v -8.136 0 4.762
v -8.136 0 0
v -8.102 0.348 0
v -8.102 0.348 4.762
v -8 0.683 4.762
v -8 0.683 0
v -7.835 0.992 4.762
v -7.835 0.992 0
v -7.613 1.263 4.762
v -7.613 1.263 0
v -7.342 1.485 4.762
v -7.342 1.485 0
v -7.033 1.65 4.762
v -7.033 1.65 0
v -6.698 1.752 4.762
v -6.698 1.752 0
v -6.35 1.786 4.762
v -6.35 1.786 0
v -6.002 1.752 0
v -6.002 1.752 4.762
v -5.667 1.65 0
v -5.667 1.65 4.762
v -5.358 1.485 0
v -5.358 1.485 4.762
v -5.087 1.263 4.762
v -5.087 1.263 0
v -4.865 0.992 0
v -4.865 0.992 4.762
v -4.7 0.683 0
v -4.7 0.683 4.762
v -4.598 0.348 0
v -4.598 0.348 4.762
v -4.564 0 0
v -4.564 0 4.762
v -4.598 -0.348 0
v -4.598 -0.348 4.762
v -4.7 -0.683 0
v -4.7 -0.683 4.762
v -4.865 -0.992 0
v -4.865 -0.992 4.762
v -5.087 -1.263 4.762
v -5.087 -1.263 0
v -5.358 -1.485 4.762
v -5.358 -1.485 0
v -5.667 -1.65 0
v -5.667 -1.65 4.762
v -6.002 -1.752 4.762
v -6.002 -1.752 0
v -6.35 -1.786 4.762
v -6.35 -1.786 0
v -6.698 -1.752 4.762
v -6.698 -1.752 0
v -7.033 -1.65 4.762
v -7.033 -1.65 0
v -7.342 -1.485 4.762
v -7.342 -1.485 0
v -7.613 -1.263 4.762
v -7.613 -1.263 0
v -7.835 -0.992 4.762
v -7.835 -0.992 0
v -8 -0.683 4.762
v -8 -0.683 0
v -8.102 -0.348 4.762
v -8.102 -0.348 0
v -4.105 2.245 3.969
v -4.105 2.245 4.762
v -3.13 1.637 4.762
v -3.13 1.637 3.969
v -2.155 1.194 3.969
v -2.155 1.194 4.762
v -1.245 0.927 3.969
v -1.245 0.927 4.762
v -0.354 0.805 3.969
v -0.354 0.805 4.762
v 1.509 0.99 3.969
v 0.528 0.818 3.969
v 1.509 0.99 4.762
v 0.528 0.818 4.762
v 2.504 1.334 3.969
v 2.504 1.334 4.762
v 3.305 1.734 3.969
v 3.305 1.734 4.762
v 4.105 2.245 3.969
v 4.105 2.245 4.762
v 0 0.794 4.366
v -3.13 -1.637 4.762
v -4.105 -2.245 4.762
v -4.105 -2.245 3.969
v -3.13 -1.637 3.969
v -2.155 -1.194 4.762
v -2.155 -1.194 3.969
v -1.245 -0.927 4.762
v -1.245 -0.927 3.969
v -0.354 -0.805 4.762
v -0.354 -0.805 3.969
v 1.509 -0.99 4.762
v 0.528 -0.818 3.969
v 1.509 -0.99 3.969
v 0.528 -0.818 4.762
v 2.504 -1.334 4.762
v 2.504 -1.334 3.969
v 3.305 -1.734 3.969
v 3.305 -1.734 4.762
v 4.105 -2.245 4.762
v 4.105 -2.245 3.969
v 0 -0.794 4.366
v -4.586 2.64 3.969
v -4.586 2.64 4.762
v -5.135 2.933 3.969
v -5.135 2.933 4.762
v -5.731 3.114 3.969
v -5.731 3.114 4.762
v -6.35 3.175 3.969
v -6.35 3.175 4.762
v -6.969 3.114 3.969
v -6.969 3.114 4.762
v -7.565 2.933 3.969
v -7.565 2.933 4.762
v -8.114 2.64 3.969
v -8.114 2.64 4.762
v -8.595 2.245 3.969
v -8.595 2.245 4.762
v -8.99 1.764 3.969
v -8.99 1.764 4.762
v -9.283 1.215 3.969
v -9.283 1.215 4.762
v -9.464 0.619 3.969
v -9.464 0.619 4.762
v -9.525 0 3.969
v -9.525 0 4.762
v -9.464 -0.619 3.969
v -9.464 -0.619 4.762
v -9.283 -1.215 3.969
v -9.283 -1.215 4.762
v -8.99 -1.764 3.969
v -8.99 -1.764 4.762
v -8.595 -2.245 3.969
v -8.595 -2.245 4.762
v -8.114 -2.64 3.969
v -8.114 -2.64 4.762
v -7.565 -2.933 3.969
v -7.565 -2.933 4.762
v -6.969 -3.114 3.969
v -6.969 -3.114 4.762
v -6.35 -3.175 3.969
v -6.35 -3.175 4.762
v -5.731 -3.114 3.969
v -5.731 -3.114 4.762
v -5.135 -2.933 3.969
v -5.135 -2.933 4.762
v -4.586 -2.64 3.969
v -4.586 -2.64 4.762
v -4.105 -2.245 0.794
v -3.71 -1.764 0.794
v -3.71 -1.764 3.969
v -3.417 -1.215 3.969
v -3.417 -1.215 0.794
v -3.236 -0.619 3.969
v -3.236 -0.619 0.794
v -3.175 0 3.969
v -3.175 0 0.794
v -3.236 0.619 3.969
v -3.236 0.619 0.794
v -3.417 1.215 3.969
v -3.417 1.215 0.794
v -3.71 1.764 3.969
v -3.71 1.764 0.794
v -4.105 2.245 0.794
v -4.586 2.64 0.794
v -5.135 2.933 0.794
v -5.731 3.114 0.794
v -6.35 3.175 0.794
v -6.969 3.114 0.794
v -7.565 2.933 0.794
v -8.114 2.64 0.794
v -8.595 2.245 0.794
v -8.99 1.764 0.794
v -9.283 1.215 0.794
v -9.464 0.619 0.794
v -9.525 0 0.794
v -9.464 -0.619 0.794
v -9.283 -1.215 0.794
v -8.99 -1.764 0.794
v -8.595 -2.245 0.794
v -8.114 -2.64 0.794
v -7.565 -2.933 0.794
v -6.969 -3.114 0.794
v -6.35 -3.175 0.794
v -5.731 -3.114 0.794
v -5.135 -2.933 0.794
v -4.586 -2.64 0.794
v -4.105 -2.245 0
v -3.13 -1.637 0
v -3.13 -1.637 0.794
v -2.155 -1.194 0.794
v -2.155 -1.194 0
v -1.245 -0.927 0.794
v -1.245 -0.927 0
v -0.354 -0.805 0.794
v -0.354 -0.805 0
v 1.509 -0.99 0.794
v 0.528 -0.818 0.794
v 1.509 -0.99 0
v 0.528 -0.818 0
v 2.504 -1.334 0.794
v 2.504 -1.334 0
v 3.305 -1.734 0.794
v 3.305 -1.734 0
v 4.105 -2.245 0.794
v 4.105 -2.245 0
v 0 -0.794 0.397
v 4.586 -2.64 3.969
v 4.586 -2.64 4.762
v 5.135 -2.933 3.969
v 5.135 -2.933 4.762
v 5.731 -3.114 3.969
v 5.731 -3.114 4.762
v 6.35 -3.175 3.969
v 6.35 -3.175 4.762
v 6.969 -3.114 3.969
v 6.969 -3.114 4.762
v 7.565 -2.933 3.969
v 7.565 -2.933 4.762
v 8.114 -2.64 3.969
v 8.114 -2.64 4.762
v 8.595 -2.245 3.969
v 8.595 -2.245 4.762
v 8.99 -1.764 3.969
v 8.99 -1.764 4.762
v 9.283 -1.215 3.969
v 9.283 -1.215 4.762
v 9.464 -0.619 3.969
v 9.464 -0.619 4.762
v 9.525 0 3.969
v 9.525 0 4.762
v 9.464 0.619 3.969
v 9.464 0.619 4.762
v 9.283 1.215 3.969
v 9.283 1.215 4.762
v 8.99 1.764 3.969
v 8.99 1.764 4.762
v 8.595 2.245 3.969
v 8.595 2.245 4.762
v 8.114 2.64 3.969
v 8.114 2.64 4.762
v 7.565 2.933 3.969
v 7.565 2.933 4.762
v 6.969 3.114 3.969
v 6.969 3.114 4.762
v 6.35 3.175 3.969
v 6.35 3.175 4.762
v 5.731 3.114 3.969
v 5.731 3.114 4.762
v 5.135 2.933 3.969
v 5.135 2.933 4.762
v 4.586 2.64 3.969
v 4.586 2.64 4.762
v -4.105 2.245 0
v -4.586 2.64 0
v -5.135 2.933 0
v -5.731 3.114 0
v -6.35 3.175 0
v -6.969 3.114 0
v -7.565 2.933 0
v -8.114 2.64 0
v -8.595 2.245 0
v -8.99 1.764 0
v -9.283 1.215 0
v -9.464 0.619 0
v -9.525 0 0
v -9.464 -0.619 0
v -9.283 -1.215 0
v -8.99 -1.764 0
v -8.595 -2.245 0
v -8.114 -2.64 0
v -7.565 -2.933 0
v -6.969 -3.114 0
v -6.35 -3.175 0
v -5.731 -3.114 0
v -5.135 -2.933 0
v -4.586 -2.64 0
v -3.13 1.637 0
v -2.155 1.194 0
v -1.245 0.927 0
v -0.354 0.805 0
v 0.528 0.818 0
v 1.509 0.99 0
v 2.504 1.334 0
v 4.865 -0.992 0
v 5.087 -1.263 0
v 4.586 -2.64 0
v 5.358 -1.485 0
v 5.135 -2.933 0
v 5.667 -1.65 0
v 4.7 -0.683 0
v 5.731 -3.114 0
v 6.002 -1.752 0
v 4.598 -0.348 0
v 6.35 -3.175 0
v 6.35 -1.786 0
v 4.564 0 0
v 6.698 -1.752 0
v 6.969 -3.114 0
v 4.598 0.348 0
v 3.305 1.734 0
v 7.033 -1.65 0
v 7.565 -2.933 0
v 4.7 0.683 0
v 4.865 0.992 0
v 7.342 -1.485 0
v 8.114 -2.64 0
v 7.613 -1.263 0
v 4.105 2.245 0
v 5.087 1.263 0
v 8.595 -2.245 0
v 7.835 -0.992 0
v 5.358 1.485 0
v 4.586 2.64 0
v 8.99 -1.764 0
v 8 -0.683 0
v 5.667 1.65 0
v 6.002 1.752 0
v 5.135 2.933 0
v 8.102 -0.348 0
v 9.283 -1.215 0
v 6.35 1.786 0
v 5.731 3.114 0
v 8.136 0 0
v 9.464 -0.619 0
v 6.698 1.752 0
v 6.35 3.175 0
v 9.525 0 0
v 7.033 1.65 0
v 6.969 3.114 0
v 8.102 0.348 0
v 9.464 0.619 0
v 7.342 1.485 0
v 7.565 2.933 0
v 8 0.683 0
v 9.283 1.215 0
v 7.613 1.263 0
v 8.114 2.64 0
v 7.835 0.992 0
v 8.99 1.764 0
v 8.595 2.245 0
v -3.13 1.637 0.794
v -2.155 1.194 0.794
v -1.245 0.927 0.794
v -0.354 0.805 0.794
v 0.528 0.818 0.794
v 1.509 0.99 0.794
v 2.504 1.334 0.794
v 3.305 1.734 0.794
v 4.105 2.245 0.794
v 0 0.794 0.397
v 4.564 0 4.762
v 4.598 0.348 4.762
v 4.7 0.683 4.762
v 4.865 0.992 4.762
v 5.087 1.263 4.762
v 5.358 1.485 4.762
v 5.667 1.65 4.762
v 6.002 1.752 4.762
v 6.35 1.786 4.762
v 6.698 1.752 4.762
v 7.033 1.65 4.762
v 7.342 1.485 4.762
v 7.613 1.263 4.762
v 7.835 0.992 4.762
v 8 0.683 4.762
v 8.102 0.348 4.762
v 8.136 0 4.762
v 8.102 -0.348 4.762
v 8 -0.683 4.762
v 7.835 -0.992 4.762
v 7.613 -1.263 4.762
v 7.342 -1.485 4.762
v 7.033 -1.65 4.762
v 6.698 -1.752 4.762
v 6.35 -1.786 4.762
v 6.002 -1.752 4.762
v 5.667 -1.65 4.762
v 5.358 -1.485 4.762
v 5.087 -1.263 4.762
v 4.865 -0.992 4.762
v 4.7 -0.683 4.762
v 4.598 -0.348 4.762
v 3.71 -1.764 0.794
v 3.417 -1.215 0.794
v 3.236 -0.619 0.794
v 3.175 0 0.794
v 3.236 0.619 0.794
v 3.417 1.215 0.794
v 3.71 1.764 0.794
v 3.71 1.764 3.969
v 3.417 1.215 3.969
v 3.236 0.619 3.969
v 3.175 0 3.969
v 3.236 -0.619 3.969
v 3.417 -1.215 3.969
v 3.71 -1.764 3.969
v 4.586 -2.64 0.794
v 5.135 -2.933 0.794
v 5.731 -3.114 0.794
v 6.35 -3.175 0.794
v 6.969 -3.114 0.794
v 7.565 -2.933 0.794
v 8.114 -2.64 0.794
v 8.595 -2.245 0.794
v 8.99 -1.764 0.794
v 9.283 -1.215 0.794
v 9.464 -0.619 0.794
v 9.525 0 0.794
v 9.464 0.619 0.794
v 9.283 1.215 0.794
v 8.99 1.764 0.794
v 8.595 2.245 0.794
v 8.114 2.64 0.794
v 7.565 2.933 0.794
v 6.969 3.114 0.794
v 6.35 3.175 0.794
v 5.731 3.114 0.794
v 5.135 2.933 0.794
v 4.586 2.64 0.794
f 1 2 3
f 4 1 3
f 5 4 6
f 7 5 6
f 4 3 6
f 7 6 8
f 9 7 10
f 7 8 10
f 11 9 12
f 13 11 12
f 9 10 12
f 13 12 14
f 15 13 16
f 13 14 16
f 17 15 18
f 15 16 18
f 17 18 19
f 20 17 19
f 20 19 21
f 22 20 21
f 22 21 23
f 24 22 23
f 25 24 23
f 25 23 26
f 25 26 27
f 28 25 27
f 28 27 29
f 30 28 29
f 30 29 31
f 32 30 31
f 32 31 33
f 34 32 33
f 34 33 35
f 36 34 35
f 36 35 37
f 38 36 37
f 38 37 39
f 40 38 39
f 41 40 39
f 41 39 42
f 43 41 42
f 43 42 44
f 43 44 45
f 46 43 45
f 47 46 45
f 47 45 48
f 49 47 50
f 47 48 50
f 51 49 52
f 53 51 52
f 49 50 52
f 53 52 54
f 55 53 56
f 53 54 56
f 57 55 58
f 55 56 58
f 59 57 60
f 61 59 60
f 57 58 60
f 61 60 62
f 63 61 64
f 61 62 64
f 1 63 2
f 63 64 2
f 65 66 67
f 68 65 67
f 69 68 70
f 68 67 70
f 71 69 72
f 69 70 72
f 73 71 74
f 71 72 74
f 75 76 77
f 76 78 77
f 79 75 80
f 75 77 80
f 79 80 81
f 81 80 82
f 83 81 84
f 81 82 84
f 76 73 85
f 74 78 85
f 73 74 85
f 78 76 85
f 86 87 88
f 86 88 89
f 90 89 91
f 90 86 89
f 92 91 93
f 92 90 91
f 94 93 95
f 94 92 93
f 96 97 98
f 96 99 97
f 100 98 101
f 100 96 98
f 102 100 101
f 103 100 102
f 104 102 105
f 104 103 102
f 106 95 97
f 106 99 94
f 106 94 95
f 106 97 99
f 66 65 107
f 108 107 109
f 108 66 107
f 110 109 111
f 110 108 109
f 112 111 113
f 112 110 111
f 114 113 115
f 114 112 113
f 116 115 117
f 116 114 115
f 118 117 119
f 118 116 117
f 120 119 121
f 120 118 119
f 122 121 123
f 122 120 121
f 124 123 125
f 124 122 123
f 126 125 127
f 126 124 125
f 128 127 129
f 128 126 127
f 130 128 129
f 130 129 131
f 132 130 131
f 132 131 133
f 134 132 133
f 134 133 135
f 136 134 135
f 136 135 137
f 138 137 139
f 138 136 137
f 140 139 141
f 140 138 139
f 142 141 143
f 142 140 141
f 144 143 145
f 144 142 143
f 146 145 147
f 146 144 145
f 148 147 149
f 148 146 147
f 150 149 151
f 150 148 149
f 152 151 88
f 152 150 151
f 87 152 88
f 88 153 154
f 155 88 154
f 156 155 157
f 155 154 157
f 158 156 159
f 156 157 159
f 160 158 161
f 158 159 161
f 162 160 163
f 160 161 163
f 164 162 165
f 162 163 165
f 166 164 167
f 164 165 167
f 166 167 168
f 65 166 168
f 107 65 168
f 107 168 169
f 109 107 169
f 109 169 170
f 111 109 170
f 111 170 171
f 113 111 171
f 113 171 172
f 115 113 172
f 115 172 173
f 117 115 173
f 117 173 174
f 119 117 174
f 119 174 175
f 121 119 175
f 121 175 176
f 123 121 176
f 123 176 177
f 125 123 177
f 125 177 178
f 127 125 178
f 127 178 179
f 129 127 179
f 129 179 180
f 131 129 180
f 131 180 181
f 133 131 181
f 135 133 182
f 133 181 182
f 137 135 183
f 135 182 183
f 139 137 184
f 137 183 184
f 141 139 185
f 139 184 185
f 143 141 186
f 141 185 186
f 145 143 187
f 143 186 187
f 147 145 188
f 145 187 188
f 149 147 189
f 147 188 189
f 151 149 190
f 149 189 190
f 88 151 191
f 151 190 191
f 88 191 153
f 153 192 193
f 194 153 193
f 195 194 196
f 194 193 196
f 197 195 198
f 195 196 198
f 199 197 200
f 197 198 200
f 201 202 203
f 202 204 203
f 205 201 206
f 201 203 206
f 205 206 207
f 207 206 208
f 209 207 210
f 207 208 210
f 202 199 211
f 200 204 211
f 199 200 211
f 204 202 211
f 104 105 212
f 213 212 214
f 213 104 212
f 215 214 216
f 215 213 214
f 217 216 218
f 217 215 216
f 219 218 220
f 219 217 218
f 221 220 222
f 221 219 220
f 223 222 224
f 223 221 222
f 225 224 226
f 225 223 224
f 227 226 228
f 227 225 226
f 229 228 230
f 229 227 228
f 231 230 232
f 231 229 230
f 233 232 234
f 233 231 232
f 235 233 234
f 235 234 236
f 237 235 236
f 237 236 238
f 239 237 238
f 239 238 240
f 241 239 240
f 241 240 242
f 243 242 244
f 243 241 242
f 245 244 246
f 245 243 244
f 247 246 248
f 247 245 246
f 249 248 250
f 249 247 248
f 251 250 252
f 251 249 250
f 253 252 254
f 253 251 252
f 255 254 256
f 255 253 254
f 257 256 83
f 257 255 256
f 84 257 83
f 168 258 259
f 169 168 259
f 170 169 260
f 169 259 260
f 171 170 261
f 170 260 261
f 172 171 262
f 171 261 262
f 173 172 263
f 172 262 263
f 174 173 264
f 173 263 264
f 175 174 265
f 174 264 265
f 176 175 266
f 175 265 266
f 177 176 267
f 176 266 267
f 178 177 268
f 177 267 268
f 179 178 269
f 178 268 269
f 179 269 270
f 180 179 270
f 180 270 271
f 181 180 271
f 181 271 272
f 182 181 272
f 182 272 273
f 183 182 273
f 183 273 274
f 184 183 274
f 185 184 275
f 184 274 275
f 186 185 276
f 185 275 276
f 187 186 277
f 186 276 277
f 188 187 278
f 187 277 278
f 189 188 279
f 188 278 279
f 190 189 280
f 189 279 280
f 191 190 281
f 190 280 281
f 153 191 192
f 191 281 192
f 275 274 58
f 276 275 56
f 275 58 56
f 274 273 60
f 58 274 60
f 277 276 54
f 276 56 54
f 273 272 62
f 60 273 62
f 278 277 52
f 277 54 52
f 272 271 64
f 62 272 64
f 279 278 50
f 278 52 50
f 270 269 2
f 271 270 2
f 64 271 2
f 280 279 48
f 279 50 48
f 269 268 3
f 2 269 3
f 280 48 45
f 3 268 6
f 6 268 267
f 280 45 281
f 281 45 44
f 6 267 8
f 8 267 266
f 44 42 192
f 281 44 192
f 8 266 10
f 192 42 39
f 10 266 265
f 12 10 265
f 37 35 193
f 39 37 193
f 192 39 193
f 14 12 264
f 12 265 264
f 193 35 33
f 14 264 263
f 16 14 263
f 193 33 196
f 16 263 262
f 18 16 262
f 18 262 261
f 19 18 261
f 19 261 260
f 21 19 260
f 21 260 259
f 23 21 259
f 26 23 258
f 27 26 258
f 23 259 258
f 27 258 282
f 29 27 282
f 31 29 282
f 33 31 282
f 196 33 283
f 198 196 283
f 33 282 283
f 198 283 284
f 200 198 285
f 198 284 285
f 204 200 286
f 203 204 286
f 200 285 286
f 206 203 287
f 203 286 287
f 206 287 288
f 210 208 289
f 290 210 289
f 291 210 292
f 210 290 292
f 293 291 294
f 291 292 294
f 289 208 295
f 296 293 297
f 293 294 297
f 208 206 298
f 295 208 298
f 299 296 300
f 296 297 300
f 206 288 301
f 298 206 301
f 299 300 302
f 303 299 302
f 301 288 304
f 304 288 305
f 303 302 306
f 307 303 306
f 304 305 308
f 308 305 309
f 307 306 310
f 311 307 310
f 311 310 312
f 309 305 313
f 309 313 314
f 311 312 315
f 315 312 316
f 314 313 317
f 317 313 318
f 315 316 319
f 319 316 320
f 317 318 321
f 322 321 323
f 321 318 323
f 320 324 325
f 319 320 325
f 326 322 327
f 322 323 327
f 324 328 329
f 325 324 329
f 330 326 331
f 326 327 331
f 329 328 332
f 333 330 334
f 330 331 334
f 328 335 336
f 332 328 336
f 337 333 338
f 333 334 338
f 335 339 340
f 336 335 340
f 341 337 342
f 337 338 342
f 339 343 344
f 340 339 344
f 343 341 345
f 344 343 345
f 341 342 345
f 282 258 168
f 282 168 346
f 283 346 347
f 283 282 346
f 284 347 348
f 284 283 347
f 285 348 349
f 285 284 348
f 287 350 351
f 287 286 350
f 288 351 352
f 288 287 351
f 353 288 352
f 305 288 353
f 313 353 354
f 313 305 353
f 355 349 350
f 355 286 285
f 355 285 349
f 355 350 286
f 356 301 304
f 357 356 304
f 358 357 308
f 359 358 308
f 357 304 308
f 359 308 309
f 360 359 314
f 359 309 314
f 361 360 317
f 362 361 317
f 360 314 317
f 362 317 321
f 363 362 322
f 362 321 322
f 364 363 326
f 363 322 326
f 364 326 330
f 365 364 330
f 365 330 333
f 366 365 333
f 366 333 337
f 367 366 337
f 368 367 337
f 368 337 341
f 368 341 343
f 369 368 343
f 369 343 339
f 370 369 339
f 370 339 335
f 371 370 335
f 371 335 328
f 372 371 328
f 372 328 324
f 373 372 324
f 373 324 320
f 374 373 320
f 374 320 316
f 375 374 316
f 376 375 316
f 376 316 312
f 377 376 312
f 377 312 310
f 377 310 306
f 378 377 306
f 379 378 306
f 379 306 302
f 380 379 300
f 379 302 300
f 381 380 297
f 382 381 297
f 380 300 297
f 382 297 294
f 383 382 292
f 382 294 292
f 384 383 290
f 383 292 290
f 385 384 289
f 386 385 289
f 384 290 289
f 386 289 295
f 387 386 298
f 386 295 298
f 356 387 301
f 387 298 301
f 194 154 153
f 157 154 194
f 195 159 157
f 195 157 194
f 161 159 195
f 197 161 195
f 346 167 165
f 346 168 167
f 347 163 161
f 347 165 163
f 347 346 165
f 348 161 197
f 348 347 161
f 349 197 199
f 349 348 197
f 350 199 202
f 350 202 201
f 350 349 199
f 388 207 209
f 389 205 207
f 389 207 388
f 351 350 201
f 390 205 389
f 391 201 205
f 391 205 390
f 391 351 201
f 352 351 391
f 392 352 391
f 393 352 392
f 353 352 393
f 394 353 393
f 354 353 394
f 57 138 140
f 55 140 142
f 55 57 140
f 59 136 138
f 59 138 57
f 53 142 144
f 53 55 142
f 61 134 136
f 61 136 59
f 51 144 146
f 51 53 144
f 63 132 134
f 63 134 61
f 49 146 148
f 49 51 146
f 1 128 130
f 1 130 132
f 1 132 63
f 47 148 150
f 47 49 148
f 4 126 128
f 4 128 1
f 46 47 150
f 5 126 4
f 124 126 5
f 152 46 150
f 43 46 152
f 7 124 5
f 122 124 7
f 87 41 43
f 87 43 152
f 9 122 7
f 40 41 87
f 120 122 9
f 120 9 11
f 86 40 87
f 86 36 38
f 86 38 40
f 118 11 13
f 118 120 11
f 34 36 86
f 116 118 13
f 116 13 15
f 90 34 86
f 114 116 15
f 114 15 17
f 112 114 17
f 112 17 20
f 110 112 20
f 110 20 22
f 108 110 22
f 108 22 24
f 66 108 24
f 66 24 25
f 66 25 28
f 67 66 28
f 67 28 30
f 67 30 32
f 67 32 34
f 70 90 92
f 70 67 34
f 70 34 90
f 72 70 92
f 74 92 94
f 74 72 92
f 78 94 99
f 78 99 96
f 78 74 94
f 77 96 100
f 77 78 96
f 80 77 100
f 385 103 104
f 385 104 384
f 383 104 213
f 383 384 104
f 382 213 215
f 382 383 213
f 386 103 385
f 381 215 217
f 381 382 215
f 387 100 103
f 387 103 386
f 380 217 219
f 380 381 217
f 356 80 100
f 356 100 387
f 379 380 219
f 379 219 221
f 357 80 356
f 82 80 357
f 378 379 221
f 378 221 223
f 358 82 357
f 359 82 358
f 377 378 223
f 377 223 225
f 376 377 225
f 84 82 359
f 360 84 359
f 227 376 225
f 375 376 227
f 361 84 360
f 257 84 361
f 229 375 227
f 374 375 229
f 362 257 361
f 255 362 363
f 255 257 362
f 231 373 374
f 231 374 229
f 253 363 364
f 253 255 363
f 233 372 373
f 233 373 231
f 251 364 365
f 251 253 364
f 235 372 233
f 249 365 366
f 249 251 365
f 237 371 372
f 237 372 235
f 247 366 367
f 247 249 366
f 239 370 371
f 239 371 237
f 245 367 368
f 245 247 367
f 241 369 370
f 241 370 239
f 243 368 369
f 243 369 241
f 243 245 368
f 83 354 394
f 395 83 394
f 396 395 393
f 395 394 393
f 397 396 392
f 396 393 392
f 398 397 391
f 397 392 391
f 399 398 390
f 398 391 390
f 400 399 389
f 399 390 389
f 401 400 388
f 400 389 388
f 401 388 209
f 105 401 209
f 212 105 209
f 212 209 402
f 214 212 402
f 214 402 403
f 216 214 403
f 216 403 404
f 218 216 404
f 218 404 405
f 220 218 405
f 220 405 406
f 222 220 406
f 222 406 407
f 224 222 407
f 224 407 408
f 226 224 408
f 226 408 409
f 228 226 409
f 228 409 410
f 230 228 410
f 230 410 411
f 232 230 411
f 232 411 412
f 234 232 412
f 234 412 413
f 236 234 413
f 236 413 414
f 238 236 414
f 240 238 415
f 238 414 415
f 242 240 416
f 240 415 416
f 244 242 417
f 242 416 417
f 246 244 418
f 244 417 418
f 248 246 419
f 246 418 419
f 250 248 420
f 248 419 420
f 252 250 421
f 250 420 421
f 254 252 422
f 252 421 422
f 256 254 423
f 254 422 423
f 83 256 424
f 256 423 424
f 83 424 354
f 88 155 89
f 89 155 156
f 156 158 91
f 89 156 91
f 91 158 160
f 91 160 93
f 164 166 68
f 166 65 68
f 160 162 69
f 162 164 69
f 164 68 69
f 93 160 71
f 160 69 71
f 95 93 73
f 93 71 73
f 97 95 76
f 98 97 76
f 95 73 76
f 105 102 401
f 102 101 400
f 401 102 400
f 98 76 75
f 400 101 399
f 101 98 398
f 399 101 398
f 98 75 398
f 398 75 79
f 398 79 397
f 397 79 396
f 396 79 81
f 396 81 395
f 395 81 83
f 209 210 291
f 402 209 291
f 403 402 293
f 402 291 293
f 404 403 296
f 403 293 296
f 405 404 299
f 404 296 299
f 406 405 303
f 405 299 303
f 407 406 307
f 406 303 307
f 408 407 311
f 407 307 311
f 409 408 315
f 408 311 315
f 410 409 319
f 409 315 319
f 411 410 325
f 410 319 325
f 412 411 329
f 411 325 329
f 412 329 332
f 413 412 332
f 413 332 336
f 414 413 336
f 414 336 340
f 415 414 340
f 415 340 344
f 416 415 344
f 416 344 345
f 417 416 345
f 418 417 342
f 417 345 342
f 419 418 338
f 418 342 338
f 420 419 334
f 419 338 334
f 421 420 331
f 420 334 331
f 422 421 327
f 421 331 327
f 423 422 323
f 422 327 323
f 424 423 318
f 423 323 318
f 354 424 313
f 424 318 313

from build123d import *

# Parameters (mm, degrees)
BOSS_EXTRUDE1_DEPTH = 0.79375
SKETCH2_R           = 3.175
BOSS_EXTRUDE2_DEPTH = 3.175
SKETCH3_R           = 1.7859375
CUT_EXTRUDE1_DEPTH  = 6.35


with BuildPart() as part:
    # Sketch1 → Boss-Extrude1 (new body)
    with BuildSketch(Plane.XY):
        with BuildLine():
            ThreePointArc((-4.10493597, 2.24506403), (-9.525, 0), (-4.10493597, -2.24506403))
            add(Edge.make_bspline(
                [(-4.10493597, -2.24506403), (0, 0.65756403), (4.10493597, -2.24506403)],
                knots=[0, 0, 0, 1, 1, 1], degree=2))
            ThreePointArc((4.10493597, -2.24506403), (9.525, 0), (4.10493597, 2.24506403))
            add(Edge.make_bspline(
                [(-4.10493597, 2.24506403), (0, -0.65756403), (4.10493597, 2.24506403)],
                knots=[0, 0, 0, 1, 1, 1], degree=2))
        make_face()
    boss_extrude1 = extrude(amount=BOSS_EXTRUDE1_DEPTH)

    # Sketch2 → Boss-Extrude2 (add)
    with BuildSketch(Plane.XY.offset(0.79375)):
        with Locations(Location((-6.35, 0, 0), (0, 0, 315))):
            Circle(SKETCH2_R)
        with Locations(Location((6.35, 0, 0), (0, 0, 135))):
            Circle(SKETCH2_R)
    extrude(amount=BOSS_EXTRUDE2_DEPTH)

    # Mirror1: Boss-Extrude1 across plane
    add(boss_extrude1.mirror(Plane.XY.offset(2.38125)))

    # Sketch3 → Cut-Extrude1 (cut)
    with BuildSketch(Plane(origin=(0, 0, 0), x_dir=(-1, 0, 0), z_dir=(0, 0, -1))):
        with Locations((-6.35, 0)):
            Circle(SKETCH3_R)
        with Locations((6.35, 0)):
            Circle(SKETCH3_R)
    extrude(amount=-CUT_EXTRUDE1_DEPTH, mode=Mode.SUBTRACT)


solid = part.part
